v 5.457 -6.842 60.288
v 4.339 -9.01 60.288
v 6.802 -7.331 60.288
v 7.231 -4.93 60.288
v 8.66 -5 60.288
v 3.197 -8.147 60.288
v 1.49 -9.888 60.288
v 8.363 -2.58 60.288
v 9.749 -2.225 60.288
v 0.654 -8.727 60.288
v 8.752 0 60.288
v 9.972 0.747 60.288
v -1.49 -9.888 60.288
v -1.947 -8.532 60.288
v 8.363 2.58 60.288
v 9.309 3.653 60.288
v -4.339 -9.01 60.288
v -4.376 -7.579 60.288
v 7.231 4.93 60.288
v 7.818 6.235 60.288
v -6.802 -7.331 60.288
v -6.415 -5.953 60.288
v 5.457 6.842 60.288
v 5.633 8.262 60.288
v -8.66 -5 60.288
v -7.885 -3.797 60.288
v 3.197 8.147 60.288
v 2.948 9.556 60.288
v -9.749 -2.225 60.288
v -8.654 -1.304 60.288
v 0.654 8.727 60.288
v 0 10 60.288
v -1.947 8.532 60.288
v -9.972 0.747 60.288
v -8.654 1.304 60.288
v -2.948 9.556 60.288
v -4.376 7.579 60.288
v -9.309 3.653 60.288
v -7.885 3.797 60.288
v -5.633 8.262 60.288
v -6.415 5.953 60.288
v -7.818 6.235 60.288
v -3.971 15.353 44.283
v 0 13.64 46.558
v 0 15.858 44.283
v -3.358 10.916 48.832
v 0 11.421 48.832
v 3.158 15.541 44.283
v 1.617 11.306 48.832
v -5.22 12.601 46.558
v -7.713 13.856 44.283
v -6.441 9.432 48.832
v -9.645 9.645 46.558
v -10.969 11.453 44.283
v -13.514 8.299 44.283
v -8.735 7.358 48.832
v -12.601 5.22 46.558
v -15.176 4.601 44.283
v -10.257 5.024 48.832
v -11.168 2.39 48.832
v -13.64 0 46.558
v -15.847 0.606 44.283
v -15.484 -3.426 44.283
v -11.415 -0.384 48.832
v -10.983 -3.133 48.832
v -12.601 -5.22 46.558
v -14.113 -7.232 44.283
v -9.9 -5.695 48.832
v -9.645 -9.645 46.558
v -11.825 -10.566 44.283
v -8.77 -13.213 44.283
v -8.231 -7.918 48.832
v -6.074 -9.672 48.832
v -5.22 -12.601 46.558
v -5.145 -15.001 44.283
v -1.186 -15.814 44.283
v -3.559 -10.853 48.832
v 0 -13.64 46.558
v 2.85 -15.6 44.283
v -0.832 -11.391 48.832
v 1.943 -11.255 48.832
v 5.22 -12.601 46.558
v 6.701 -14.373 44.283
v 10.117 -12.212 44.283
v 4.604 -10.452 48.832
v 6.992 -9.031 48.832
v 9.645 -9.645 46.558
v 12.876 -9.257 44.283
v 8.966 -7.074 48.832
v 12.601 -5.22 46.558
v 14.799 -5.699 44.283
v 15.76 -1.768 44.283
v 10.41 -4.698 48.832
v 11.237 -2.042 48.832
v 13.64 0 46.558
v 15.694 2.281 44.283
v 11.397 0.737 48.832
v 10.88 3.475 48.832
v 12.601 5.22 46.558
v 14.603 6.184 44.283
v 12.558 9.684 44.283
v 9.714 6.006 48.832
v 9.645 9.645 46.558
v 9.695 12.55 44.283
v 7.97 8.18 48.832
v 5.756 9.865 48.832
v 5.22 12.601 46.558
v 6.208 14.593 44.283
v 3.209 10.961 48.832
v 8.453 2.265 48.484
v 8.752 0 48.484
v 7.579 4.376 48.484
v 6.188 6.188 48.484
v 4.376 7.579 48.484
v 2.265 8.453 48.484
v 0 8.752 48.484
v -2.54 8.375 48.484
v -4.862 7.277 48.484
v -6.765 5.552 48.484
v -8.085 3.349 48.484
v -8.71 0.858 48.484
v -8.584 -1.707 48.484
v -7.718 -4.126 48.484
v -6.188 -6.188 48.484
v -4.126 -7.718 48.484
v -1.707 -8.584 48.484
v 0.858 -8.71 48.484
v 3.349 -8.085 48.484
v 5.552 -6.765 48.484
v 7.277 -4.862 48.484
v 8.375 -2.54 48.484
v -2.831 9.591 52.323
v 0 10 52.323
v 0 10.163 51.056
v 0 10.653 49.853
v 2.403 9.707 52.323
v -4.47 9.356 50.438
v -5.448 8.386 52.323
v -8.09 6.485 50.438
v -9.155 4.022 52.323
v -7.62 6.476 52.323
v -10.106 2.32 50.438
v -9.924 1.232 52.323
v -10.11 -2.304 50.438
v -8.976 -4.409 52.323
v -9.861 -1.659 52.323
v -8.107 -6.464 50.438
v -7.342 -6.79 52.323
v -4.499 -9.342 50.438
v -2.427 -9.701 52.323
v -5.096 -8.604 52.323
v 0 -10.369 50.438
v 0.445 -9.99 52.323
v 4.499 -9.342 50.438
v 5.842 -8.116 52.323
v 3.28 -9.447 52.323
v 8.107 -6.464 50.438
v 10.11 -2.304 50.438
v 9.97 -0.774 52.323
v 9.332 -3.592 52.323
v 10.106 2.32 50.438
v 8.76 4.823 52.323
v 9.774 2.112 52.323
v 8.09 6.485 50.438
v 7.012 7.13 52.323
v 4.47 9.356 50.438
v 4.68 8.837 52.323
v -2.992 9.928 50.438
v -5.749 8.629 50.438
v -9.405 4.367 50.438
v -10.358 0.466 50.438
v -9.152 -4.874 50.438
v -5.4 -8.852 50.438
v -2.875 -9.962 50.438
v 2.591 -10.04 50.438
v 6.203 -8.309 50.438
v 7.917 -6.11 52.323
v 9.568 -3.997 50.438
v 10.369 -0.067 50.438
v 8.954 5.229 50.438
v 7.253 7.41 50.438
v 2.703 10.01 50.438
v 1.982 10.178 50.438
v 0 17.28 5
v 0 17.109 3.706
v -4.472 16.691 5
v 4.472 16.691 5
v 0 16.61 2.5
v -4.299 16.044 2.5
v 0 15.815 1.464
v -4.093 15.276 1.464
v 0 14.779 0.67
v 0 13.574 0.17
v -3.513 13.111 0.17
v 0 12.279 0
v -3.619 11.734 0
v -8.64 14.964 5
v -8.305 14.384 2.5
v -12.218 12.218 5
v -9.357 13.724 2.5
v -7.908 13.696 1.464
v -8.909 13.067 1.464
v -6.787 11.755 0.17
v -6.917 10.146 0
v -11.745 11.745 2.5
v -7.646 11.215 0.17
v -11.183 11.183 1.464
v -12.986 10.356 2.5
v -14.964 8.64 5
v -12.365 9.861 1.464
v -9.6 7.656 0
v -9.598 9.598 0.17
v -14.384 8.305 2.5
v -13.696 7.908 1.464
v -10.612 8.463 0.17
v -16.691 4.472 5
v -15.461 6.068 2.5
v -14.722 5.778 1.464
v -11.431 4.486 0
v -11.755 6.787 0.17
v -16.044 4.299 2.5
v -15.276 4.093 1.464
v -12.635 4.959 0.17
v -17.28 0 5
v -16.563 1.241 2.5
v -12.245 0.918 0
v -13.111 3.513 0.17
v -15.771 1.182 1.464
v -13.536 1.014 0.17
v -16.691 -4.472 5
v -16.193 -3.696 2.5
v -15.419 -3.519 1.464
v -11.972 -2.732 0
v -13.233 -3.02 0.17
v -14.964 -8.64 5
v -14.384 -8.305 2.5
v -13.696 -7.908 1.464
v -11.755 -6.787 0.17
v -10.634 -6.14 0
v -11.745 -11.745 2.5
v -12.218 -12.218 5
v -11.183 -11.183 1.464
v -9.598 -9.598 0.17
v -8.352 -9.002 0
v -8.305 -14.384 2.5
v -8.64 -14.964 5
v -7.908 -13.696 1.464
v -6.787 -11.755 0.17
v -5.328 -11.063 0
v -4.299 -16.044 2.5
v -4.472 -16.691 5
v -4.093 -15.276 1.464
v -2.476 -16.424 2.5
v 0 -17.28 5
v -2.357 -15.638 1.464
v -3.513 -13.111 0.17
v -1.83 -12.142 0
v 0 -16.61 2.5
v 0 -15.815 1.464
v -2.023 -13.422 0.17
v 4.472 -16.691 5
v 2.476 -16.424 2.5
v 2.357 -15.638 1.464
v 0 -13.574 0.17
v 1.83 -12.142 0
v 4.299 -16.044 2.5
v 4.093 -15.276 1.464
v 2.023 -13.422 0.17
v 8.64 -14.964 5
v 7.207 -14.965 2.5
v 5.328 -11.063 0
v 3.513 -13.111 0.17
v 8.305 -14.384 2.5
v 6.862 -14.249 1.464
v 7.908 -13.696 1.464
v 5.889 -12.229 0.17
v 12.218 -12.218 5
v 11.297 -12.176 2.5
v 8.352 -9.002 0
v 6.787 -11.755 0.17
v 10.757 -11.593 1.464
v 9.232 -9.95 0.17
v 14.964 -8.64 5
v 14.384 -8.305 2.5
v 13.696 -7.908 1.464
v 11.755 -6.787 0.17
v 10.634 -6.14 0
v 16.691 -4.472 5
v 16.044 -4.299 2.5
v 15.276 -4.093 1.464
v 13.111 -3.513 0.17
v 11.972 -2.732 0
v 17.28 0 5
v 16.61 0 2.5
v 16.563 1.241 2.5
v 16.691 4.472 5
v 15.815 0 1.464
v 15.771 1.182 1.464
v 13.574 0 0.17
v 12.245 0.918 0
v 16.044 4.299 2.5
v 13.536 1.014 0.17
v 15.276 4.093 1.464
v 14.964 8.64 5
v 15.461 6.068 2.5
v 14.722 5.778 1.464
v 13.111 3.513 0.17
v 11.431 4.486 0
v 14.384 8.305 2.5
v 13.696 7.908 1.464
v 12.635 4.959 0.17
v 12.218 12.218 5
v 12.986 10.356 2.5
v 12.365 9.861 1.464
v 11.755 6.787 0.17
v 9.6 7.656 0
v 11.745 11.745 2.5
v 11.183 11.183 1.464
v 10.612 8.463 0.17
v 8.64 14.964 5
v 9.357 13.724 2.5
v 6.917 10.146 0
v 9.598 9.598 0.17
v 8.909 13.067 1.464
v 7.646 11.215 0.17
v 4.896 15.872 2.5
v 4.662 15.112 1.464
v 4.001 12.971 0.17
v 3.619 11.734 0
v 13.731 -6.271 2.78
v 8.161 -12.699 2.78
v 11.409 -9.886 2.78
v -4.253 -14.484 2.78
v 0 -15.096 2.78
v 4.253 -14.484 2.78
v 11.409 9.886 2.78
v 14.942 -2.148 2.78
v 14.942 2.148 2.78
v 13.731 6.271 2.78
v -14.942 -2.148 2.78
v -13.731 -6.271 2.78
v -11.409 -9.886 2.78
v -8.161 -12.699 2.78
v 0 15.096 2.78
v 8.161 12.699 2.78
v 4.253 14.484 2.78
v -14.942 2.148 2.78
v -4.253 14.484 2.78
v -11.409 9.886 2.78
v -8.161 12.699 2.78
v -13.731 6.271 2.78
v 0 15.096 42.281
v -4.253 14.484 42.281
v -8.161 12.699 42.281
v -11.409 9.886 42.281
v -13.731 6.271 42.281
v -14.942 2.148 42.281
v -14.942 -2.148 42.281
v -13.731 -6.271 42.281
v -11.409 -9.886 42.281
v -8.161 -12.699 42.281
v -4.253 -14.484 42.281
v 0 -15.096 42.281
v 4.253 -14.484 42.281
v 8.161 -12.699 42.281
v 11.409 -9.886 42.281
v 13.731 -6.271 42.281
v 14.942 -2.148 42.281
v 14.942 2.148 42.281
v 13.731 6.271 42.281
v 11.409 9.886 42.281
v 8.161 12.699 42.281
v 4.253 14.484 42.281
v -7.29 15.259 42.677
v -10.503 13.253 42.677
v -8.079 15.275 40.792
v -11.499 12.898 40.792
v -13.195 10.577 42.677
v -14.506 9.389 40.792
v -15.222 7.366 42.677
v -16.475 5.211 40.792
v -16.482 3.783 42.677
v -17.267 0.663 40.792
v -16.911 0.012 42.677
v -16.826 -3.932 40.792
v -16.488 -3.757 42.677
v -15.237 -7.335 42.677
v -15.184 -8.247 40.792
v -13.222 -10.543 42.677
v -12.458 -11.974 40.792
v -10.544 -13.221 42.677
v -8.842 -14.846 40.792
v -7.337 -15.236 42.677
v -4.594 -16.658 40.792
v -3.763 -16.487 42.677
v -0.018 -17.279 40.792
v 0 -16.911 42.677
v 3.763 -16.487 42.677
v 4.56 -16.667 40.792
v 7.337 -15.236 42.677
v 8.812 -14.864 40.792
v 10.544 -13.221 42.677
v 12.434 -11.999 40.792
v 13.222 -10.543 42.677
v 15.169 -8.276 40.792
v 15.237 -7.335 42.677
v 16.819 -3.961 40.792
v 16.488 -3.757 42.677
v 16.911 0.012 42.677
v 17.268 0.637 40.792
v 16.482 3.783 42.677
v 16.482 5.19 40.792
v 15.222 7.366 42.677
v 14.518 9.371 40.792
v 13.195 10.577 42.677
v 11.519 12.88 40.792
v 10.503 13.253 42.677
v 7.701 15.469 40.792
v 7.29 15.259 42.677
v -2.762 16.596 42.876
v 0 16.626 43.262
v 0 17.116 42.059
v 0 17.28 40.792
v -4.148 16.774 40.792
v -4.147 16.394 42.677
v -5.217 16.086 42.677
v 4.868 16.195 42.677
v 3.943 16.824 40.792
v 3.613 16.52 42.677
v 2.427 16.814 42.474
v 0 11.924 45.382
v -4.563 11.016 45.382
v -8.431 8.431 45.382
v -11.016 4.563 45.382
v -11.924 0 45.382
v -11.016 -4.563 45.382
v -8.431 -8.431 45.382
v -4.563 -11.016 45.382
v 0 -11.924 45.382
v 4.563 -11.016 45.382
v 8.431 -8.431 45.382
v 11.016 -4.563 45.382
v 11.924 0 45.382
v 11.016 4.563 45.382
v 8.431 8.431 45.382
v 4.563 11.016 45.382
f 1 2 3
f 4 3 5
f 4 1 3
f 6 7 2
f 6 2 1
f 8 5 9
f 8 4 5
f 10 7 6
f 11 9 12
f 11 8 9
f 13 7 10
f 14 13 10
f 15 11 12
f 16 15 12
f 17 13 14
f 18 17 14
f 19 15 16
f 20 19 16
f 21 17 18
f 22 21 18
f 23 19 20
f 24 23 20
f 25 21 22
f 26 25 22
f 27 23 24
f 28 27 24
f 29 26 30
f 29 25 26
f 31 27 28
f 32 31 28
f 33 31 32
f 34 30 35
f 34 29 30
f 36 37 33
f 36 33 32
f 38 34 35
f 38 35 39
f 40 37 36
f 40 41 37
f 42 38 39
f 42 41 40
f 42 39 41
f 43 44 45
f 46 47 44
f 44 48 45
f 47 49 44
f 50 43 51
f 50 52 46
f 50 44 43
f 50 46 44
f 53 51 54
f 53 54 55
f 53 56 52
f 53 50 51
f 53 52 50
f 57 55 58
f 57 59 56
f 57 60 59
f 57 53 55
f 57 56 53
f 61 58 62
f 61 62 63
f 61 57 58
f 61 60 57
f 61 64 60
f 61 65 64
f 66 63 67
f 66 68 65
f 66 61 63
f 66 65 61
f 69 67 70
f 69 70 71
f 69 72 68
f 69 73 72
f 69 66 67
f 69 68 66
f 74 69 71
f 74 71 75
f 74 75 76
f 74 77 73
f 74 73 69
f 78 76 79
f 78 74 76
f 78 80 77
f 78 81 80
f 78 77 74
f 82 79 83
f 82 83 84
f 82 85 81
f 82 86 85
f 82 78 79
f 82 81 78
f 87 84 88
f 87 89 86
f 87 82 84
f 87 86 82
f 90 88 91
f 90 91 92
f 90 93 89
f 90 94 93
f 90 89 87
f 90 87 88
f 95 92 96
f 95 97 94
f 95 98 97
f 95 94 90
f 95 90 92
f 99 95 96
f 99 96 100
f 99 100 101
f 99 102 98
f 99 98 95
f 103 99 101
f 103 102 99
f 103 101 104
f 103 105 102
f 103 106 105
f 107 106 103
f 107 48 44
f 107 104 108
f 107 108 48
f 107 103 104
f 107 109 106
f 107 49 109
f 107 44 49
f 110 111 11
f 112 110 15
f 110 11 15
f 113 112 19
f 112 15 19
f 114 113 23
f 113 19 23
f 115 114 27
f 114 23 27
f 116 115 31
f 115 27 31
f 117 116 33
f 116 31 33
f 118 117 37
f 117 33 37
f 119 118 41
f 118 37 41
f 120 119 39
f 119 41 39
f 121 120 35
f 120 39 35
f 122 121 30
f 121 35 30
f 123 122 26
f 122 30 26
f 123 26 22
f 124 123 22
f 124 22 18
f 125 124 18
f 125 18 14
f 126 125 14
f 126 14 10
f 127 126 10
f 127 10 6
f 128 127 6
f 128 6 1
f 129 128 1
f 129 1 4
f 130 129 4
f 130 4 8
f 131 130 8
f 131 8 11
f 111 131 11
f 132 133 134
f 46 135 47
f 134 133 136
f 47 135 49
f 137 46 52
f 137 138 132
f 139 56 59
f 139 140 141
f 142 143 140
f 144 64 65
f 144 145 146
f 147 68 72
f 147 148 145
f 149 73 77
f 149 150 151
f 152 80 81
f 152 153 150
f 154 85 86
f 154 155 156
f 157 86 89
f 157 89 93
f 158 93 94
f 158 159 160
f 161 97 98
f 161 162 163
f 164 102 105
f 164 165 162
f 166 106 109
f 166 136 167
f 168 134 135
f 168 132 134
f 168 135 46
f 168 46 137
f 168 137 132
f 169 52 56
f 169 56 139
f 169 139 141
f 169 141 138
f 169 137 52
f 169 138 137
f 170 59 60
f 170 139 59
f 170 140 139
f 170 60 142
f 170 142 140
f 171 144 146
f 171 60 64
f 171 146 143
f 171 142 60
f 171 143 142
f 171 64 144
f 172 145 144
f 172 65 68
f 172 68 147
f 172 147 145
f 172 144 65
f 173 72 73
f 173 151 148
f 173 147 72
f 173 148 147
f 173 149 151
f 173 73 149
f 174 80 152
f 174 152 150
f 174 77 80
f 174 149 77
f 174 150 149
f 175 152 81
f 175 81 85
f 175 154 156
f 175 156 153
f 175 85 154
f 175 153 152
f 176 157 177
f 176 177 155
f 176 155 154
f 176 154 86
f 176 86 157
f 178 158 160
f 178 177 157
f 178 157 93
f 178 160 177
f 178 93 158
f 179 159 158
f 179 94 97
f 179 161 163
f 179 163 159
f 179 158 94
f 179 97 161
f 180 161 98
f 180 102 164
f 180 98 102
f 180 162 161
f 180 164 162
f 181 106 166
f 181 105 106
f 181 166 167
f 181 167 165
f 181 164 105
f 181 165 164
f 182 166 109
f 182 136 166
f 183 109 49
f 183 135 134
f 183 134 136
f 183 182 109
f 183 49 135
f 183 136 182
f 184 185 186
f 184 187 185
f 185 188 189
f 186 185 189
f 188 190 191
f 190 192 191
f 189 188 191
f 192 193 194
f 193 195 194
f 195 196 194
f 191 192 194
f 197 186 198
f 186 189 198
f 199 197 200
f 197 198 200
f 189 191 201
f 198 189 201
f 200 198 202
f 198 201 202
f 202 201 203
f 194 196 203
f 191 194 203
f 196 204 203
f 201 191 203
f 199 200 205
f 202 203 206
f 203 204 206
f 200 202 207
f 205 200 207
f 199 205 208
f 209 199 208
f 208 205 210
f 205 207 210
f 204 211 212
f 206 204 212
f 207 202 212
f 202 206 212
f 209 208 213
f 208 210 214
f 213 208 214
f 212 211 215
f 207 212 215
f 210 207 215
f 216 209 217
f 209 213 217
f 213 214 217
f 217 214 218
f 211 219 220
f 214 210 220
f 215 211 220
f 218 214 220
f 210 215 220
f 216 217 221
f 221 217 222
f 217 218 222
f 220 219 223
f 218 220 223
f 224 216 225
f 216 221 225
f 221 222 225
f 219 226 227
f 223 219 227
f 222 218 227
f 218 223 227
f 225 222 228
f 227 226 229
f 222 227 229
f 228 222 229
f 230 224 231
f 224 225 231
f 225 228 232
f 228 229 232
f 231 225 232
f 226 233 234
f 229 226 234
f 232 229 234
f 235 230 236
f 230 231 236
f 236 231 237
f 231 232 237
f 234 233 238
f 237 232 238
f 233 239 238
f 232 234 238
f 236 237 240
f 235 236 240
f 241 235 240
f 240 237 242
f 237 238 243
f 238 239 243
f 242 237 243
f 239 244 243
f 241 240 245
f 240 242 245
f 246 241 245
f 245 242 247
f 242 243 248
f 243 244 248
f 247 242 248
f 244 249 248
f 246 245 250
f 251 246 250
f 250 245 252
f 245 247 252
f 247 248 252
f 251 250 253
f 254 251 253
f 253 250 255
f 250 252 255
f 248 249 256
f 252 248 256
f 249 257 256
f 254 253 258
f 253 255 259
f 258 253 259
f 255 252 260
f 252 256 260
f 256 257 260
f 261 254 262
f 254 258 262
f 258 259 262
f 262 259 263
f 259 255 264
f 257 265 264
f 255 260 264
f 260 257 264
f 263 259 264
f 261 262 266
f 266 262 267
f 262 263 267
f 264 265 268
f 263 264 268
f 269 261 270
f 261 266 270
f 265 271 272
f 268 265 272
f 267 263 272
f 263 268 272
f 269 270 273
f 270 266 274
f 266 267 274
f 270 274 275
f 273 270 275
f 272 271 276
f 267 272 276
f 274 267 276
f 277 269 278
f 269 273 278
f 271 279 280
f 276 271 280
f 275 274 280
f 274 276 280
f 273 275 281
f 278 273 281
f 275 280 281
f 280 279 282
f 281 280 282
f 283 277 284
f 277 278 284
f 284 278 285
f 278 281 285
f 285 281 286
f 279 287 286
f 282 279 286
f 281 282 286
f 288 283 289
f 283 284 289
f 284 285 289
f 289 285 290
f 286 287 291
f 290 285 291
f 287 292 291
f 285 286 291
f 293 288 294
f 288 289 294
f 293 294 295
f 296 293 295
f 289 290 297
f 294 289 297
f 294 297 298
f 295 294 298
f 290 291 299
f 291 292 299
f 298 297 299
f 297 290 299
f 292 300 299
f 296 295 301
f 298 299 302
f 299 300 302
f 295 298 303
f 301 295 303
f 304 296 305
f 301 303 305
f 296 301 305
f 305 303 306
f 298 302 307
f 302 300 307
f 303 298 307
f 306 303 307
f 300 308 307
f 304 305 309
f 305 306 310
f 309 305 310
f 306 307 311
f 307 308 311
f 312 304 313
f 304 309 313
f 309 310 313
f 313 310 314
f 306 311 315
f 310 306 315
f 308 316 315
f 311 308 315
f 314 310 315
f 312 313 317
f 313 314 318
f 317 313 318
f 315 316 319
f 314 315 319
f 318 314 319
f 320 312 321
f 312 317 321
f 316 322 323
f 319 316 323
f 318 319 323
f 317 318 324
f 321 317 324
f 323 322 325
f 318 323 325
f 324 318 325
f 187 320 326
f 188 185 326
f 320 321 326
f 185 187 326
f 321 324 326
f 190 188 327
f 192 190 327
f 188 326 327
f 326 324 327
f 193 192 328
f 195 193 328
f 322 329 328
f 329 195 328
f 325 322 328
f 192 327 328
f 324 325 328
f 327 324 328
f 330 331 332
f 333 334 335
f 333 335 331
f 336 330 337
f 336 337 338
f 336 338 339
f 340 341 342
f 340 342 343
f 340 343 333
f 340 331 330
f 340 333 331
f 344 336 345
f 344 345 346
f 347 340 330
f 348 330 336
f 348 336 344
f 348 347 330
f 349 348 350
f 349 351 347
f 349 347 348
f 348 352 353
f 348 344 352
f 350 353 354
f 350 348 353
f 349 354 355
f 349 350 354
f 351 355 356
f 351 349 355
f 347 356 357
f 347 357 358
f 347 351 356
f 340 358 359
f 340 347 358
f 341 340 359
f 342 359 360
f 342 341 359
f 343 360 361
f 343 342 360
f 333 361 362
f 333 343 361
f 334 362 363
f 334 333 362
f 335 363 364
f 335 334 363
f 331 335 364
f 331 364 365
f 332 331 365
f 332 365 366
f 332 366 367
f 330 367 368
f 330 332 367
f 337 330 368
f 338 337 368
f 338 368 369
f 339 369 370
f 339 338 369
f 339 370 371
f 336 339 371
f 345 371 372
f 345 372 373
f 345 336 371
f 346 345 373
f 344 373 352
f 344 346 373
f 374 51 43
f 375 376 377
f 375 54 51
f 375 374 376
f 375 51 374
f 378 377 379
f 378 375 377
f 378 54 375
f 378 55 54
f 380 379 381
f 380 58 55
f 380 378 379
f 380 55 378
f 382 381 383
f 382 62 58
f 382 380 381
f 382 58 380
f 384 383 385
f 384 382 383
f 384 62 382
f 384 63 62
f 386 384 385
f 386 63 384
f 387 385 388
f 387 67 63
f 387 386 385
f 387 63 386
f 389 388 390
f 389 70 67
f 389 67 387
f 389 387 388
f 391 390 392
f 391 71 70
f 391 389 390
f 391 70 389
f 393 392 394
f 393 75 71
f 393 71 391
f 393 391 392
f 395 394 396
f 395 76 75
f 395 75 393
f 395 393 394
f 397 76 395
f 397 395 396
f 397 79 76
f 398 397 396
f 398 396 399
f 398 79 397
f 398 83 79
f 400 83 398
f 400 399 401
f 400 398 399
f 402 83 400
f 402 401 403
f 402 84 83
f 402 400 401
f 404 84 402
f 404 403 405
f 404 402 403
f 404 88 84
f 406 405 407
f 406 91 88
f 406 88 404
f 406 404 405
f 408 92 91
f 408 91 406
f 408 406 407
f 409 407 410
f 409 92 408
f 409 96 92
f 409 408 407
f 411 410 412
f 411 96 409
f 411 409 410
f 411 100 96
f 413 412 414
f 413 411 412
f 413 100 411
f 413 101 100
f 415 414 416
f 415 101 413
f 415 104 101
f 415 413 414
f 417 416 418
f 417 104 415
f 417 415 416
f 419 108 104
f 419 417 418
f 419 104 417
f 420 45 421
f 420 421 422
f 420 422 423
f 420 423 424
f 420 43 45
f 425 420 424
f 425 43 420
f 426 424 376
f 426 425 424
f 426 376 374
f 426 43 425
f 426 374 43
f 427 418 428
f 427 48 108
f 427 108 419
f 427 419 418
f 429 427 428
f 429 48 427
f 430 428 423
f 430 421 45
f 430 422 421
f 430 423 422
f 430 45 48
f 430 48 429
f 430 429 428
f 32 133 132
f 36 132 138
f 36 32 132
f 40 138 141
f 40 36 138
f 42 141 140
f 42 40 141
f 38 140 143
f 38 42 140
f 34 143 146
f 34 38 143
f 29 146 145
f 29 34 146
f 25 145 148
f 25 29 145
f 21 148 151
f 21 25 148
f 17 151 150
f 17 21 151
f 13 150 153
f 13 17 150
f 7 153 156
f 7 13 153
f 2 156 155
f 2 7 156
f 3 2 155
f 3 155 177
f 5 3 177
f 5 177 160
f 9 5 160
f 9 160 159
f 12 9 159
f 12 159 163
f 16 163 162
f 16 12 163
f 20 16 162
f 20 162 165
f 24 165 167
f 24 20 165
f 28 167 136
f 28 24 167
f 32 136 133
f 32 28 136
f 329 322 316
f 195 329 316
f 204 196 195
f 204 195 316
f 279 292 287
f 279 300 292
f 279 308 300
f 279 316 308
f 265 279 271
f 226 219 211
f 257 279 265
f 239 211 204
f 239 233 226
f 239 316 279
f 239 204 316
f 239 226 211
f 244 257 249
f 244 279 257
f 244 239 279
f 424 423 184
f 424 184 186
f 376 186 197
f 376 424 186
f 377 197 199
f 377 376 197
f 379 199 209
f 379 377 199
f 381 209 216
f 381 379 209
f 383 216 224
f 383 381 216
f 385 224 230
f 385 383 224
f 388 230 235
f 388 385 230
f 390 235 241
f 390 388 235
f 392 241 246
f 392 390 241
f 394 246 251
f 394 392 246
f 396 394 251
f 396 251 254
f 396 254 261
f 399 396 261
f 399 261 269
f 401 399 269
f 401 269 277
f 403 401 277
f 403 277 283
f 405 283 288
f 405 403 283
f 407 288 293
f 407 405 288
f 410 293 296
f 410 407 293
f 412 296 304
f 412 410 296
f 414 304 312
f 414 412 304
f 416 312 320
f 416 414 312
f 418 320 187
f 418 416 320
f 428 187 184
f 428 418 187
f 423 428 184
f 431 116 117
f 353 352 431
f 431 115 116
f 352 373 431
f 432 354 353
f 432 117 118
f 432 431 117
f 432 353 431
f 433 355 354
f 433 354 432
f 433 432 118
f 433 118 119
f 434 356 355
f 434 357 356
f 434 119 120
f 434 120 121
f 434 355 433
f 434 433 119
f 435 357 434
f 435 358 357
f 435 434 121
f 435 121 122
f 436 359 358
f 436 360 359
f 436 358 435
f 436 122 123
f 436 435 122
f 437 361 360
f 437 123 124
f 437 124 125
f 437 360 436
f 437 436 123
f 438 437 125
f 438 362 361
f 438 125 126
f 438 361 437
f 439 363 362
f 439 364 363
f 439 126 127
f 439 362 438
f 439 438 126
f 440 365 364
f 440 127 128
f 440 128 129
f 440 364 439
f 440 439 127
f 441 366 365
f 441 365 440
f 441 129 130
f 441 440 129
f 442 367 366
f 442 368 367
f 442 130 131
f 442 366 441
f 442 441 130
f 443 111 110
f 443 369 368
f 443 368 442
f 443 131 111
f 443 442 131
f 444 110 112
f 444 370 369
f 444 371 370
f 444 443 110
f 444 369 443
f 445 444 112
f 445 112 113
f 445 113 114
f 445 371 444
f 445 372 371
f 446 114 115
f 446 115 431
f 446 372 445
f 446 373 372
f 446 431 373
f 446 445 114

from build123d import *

# Parameters (mm, degrees)
F3_R     = 8.751672
F4_DEPTH = 25
F5_R     = 5


with BuildPart() as f2:
    # F0 (on Right) → F2 (revolve)
    with BuildSketch(Plane.YZ):
        Polygon((10, 60.288332), (0, 60.288332), (0, 57.74051), (6.906209, 57.74051), (6.906209, 50.288332), (15.09565, 42.280882), (15.09565, 2.780263), (0, 2.780263), (0, 0), (17.2795, 0), (17.2795, 42.826841), (10, 50.288332), align=None)
    revolve(axis=Axis((0, 0, 30.372418), (0, 0, 1)))

    # F3 (on face) → F4 (cut)
    with BuildSketch(Plane.XY.offset(60.288332)):
        Circle(F3_R)
    extrude(amount=-F4_DEPTH, mode=Mode.SUBTRACT)

    # F5
    f5_edges = [f2.edges().sort_by_distance(p)[0] for p in [
        (0, -10, 50.288332),
        (0, -17.2795, 42.826841),
        (0, -17.2795, 0),
    ]]
    fillet(f5_edges, radius=F5_R)


solid = f2.part
